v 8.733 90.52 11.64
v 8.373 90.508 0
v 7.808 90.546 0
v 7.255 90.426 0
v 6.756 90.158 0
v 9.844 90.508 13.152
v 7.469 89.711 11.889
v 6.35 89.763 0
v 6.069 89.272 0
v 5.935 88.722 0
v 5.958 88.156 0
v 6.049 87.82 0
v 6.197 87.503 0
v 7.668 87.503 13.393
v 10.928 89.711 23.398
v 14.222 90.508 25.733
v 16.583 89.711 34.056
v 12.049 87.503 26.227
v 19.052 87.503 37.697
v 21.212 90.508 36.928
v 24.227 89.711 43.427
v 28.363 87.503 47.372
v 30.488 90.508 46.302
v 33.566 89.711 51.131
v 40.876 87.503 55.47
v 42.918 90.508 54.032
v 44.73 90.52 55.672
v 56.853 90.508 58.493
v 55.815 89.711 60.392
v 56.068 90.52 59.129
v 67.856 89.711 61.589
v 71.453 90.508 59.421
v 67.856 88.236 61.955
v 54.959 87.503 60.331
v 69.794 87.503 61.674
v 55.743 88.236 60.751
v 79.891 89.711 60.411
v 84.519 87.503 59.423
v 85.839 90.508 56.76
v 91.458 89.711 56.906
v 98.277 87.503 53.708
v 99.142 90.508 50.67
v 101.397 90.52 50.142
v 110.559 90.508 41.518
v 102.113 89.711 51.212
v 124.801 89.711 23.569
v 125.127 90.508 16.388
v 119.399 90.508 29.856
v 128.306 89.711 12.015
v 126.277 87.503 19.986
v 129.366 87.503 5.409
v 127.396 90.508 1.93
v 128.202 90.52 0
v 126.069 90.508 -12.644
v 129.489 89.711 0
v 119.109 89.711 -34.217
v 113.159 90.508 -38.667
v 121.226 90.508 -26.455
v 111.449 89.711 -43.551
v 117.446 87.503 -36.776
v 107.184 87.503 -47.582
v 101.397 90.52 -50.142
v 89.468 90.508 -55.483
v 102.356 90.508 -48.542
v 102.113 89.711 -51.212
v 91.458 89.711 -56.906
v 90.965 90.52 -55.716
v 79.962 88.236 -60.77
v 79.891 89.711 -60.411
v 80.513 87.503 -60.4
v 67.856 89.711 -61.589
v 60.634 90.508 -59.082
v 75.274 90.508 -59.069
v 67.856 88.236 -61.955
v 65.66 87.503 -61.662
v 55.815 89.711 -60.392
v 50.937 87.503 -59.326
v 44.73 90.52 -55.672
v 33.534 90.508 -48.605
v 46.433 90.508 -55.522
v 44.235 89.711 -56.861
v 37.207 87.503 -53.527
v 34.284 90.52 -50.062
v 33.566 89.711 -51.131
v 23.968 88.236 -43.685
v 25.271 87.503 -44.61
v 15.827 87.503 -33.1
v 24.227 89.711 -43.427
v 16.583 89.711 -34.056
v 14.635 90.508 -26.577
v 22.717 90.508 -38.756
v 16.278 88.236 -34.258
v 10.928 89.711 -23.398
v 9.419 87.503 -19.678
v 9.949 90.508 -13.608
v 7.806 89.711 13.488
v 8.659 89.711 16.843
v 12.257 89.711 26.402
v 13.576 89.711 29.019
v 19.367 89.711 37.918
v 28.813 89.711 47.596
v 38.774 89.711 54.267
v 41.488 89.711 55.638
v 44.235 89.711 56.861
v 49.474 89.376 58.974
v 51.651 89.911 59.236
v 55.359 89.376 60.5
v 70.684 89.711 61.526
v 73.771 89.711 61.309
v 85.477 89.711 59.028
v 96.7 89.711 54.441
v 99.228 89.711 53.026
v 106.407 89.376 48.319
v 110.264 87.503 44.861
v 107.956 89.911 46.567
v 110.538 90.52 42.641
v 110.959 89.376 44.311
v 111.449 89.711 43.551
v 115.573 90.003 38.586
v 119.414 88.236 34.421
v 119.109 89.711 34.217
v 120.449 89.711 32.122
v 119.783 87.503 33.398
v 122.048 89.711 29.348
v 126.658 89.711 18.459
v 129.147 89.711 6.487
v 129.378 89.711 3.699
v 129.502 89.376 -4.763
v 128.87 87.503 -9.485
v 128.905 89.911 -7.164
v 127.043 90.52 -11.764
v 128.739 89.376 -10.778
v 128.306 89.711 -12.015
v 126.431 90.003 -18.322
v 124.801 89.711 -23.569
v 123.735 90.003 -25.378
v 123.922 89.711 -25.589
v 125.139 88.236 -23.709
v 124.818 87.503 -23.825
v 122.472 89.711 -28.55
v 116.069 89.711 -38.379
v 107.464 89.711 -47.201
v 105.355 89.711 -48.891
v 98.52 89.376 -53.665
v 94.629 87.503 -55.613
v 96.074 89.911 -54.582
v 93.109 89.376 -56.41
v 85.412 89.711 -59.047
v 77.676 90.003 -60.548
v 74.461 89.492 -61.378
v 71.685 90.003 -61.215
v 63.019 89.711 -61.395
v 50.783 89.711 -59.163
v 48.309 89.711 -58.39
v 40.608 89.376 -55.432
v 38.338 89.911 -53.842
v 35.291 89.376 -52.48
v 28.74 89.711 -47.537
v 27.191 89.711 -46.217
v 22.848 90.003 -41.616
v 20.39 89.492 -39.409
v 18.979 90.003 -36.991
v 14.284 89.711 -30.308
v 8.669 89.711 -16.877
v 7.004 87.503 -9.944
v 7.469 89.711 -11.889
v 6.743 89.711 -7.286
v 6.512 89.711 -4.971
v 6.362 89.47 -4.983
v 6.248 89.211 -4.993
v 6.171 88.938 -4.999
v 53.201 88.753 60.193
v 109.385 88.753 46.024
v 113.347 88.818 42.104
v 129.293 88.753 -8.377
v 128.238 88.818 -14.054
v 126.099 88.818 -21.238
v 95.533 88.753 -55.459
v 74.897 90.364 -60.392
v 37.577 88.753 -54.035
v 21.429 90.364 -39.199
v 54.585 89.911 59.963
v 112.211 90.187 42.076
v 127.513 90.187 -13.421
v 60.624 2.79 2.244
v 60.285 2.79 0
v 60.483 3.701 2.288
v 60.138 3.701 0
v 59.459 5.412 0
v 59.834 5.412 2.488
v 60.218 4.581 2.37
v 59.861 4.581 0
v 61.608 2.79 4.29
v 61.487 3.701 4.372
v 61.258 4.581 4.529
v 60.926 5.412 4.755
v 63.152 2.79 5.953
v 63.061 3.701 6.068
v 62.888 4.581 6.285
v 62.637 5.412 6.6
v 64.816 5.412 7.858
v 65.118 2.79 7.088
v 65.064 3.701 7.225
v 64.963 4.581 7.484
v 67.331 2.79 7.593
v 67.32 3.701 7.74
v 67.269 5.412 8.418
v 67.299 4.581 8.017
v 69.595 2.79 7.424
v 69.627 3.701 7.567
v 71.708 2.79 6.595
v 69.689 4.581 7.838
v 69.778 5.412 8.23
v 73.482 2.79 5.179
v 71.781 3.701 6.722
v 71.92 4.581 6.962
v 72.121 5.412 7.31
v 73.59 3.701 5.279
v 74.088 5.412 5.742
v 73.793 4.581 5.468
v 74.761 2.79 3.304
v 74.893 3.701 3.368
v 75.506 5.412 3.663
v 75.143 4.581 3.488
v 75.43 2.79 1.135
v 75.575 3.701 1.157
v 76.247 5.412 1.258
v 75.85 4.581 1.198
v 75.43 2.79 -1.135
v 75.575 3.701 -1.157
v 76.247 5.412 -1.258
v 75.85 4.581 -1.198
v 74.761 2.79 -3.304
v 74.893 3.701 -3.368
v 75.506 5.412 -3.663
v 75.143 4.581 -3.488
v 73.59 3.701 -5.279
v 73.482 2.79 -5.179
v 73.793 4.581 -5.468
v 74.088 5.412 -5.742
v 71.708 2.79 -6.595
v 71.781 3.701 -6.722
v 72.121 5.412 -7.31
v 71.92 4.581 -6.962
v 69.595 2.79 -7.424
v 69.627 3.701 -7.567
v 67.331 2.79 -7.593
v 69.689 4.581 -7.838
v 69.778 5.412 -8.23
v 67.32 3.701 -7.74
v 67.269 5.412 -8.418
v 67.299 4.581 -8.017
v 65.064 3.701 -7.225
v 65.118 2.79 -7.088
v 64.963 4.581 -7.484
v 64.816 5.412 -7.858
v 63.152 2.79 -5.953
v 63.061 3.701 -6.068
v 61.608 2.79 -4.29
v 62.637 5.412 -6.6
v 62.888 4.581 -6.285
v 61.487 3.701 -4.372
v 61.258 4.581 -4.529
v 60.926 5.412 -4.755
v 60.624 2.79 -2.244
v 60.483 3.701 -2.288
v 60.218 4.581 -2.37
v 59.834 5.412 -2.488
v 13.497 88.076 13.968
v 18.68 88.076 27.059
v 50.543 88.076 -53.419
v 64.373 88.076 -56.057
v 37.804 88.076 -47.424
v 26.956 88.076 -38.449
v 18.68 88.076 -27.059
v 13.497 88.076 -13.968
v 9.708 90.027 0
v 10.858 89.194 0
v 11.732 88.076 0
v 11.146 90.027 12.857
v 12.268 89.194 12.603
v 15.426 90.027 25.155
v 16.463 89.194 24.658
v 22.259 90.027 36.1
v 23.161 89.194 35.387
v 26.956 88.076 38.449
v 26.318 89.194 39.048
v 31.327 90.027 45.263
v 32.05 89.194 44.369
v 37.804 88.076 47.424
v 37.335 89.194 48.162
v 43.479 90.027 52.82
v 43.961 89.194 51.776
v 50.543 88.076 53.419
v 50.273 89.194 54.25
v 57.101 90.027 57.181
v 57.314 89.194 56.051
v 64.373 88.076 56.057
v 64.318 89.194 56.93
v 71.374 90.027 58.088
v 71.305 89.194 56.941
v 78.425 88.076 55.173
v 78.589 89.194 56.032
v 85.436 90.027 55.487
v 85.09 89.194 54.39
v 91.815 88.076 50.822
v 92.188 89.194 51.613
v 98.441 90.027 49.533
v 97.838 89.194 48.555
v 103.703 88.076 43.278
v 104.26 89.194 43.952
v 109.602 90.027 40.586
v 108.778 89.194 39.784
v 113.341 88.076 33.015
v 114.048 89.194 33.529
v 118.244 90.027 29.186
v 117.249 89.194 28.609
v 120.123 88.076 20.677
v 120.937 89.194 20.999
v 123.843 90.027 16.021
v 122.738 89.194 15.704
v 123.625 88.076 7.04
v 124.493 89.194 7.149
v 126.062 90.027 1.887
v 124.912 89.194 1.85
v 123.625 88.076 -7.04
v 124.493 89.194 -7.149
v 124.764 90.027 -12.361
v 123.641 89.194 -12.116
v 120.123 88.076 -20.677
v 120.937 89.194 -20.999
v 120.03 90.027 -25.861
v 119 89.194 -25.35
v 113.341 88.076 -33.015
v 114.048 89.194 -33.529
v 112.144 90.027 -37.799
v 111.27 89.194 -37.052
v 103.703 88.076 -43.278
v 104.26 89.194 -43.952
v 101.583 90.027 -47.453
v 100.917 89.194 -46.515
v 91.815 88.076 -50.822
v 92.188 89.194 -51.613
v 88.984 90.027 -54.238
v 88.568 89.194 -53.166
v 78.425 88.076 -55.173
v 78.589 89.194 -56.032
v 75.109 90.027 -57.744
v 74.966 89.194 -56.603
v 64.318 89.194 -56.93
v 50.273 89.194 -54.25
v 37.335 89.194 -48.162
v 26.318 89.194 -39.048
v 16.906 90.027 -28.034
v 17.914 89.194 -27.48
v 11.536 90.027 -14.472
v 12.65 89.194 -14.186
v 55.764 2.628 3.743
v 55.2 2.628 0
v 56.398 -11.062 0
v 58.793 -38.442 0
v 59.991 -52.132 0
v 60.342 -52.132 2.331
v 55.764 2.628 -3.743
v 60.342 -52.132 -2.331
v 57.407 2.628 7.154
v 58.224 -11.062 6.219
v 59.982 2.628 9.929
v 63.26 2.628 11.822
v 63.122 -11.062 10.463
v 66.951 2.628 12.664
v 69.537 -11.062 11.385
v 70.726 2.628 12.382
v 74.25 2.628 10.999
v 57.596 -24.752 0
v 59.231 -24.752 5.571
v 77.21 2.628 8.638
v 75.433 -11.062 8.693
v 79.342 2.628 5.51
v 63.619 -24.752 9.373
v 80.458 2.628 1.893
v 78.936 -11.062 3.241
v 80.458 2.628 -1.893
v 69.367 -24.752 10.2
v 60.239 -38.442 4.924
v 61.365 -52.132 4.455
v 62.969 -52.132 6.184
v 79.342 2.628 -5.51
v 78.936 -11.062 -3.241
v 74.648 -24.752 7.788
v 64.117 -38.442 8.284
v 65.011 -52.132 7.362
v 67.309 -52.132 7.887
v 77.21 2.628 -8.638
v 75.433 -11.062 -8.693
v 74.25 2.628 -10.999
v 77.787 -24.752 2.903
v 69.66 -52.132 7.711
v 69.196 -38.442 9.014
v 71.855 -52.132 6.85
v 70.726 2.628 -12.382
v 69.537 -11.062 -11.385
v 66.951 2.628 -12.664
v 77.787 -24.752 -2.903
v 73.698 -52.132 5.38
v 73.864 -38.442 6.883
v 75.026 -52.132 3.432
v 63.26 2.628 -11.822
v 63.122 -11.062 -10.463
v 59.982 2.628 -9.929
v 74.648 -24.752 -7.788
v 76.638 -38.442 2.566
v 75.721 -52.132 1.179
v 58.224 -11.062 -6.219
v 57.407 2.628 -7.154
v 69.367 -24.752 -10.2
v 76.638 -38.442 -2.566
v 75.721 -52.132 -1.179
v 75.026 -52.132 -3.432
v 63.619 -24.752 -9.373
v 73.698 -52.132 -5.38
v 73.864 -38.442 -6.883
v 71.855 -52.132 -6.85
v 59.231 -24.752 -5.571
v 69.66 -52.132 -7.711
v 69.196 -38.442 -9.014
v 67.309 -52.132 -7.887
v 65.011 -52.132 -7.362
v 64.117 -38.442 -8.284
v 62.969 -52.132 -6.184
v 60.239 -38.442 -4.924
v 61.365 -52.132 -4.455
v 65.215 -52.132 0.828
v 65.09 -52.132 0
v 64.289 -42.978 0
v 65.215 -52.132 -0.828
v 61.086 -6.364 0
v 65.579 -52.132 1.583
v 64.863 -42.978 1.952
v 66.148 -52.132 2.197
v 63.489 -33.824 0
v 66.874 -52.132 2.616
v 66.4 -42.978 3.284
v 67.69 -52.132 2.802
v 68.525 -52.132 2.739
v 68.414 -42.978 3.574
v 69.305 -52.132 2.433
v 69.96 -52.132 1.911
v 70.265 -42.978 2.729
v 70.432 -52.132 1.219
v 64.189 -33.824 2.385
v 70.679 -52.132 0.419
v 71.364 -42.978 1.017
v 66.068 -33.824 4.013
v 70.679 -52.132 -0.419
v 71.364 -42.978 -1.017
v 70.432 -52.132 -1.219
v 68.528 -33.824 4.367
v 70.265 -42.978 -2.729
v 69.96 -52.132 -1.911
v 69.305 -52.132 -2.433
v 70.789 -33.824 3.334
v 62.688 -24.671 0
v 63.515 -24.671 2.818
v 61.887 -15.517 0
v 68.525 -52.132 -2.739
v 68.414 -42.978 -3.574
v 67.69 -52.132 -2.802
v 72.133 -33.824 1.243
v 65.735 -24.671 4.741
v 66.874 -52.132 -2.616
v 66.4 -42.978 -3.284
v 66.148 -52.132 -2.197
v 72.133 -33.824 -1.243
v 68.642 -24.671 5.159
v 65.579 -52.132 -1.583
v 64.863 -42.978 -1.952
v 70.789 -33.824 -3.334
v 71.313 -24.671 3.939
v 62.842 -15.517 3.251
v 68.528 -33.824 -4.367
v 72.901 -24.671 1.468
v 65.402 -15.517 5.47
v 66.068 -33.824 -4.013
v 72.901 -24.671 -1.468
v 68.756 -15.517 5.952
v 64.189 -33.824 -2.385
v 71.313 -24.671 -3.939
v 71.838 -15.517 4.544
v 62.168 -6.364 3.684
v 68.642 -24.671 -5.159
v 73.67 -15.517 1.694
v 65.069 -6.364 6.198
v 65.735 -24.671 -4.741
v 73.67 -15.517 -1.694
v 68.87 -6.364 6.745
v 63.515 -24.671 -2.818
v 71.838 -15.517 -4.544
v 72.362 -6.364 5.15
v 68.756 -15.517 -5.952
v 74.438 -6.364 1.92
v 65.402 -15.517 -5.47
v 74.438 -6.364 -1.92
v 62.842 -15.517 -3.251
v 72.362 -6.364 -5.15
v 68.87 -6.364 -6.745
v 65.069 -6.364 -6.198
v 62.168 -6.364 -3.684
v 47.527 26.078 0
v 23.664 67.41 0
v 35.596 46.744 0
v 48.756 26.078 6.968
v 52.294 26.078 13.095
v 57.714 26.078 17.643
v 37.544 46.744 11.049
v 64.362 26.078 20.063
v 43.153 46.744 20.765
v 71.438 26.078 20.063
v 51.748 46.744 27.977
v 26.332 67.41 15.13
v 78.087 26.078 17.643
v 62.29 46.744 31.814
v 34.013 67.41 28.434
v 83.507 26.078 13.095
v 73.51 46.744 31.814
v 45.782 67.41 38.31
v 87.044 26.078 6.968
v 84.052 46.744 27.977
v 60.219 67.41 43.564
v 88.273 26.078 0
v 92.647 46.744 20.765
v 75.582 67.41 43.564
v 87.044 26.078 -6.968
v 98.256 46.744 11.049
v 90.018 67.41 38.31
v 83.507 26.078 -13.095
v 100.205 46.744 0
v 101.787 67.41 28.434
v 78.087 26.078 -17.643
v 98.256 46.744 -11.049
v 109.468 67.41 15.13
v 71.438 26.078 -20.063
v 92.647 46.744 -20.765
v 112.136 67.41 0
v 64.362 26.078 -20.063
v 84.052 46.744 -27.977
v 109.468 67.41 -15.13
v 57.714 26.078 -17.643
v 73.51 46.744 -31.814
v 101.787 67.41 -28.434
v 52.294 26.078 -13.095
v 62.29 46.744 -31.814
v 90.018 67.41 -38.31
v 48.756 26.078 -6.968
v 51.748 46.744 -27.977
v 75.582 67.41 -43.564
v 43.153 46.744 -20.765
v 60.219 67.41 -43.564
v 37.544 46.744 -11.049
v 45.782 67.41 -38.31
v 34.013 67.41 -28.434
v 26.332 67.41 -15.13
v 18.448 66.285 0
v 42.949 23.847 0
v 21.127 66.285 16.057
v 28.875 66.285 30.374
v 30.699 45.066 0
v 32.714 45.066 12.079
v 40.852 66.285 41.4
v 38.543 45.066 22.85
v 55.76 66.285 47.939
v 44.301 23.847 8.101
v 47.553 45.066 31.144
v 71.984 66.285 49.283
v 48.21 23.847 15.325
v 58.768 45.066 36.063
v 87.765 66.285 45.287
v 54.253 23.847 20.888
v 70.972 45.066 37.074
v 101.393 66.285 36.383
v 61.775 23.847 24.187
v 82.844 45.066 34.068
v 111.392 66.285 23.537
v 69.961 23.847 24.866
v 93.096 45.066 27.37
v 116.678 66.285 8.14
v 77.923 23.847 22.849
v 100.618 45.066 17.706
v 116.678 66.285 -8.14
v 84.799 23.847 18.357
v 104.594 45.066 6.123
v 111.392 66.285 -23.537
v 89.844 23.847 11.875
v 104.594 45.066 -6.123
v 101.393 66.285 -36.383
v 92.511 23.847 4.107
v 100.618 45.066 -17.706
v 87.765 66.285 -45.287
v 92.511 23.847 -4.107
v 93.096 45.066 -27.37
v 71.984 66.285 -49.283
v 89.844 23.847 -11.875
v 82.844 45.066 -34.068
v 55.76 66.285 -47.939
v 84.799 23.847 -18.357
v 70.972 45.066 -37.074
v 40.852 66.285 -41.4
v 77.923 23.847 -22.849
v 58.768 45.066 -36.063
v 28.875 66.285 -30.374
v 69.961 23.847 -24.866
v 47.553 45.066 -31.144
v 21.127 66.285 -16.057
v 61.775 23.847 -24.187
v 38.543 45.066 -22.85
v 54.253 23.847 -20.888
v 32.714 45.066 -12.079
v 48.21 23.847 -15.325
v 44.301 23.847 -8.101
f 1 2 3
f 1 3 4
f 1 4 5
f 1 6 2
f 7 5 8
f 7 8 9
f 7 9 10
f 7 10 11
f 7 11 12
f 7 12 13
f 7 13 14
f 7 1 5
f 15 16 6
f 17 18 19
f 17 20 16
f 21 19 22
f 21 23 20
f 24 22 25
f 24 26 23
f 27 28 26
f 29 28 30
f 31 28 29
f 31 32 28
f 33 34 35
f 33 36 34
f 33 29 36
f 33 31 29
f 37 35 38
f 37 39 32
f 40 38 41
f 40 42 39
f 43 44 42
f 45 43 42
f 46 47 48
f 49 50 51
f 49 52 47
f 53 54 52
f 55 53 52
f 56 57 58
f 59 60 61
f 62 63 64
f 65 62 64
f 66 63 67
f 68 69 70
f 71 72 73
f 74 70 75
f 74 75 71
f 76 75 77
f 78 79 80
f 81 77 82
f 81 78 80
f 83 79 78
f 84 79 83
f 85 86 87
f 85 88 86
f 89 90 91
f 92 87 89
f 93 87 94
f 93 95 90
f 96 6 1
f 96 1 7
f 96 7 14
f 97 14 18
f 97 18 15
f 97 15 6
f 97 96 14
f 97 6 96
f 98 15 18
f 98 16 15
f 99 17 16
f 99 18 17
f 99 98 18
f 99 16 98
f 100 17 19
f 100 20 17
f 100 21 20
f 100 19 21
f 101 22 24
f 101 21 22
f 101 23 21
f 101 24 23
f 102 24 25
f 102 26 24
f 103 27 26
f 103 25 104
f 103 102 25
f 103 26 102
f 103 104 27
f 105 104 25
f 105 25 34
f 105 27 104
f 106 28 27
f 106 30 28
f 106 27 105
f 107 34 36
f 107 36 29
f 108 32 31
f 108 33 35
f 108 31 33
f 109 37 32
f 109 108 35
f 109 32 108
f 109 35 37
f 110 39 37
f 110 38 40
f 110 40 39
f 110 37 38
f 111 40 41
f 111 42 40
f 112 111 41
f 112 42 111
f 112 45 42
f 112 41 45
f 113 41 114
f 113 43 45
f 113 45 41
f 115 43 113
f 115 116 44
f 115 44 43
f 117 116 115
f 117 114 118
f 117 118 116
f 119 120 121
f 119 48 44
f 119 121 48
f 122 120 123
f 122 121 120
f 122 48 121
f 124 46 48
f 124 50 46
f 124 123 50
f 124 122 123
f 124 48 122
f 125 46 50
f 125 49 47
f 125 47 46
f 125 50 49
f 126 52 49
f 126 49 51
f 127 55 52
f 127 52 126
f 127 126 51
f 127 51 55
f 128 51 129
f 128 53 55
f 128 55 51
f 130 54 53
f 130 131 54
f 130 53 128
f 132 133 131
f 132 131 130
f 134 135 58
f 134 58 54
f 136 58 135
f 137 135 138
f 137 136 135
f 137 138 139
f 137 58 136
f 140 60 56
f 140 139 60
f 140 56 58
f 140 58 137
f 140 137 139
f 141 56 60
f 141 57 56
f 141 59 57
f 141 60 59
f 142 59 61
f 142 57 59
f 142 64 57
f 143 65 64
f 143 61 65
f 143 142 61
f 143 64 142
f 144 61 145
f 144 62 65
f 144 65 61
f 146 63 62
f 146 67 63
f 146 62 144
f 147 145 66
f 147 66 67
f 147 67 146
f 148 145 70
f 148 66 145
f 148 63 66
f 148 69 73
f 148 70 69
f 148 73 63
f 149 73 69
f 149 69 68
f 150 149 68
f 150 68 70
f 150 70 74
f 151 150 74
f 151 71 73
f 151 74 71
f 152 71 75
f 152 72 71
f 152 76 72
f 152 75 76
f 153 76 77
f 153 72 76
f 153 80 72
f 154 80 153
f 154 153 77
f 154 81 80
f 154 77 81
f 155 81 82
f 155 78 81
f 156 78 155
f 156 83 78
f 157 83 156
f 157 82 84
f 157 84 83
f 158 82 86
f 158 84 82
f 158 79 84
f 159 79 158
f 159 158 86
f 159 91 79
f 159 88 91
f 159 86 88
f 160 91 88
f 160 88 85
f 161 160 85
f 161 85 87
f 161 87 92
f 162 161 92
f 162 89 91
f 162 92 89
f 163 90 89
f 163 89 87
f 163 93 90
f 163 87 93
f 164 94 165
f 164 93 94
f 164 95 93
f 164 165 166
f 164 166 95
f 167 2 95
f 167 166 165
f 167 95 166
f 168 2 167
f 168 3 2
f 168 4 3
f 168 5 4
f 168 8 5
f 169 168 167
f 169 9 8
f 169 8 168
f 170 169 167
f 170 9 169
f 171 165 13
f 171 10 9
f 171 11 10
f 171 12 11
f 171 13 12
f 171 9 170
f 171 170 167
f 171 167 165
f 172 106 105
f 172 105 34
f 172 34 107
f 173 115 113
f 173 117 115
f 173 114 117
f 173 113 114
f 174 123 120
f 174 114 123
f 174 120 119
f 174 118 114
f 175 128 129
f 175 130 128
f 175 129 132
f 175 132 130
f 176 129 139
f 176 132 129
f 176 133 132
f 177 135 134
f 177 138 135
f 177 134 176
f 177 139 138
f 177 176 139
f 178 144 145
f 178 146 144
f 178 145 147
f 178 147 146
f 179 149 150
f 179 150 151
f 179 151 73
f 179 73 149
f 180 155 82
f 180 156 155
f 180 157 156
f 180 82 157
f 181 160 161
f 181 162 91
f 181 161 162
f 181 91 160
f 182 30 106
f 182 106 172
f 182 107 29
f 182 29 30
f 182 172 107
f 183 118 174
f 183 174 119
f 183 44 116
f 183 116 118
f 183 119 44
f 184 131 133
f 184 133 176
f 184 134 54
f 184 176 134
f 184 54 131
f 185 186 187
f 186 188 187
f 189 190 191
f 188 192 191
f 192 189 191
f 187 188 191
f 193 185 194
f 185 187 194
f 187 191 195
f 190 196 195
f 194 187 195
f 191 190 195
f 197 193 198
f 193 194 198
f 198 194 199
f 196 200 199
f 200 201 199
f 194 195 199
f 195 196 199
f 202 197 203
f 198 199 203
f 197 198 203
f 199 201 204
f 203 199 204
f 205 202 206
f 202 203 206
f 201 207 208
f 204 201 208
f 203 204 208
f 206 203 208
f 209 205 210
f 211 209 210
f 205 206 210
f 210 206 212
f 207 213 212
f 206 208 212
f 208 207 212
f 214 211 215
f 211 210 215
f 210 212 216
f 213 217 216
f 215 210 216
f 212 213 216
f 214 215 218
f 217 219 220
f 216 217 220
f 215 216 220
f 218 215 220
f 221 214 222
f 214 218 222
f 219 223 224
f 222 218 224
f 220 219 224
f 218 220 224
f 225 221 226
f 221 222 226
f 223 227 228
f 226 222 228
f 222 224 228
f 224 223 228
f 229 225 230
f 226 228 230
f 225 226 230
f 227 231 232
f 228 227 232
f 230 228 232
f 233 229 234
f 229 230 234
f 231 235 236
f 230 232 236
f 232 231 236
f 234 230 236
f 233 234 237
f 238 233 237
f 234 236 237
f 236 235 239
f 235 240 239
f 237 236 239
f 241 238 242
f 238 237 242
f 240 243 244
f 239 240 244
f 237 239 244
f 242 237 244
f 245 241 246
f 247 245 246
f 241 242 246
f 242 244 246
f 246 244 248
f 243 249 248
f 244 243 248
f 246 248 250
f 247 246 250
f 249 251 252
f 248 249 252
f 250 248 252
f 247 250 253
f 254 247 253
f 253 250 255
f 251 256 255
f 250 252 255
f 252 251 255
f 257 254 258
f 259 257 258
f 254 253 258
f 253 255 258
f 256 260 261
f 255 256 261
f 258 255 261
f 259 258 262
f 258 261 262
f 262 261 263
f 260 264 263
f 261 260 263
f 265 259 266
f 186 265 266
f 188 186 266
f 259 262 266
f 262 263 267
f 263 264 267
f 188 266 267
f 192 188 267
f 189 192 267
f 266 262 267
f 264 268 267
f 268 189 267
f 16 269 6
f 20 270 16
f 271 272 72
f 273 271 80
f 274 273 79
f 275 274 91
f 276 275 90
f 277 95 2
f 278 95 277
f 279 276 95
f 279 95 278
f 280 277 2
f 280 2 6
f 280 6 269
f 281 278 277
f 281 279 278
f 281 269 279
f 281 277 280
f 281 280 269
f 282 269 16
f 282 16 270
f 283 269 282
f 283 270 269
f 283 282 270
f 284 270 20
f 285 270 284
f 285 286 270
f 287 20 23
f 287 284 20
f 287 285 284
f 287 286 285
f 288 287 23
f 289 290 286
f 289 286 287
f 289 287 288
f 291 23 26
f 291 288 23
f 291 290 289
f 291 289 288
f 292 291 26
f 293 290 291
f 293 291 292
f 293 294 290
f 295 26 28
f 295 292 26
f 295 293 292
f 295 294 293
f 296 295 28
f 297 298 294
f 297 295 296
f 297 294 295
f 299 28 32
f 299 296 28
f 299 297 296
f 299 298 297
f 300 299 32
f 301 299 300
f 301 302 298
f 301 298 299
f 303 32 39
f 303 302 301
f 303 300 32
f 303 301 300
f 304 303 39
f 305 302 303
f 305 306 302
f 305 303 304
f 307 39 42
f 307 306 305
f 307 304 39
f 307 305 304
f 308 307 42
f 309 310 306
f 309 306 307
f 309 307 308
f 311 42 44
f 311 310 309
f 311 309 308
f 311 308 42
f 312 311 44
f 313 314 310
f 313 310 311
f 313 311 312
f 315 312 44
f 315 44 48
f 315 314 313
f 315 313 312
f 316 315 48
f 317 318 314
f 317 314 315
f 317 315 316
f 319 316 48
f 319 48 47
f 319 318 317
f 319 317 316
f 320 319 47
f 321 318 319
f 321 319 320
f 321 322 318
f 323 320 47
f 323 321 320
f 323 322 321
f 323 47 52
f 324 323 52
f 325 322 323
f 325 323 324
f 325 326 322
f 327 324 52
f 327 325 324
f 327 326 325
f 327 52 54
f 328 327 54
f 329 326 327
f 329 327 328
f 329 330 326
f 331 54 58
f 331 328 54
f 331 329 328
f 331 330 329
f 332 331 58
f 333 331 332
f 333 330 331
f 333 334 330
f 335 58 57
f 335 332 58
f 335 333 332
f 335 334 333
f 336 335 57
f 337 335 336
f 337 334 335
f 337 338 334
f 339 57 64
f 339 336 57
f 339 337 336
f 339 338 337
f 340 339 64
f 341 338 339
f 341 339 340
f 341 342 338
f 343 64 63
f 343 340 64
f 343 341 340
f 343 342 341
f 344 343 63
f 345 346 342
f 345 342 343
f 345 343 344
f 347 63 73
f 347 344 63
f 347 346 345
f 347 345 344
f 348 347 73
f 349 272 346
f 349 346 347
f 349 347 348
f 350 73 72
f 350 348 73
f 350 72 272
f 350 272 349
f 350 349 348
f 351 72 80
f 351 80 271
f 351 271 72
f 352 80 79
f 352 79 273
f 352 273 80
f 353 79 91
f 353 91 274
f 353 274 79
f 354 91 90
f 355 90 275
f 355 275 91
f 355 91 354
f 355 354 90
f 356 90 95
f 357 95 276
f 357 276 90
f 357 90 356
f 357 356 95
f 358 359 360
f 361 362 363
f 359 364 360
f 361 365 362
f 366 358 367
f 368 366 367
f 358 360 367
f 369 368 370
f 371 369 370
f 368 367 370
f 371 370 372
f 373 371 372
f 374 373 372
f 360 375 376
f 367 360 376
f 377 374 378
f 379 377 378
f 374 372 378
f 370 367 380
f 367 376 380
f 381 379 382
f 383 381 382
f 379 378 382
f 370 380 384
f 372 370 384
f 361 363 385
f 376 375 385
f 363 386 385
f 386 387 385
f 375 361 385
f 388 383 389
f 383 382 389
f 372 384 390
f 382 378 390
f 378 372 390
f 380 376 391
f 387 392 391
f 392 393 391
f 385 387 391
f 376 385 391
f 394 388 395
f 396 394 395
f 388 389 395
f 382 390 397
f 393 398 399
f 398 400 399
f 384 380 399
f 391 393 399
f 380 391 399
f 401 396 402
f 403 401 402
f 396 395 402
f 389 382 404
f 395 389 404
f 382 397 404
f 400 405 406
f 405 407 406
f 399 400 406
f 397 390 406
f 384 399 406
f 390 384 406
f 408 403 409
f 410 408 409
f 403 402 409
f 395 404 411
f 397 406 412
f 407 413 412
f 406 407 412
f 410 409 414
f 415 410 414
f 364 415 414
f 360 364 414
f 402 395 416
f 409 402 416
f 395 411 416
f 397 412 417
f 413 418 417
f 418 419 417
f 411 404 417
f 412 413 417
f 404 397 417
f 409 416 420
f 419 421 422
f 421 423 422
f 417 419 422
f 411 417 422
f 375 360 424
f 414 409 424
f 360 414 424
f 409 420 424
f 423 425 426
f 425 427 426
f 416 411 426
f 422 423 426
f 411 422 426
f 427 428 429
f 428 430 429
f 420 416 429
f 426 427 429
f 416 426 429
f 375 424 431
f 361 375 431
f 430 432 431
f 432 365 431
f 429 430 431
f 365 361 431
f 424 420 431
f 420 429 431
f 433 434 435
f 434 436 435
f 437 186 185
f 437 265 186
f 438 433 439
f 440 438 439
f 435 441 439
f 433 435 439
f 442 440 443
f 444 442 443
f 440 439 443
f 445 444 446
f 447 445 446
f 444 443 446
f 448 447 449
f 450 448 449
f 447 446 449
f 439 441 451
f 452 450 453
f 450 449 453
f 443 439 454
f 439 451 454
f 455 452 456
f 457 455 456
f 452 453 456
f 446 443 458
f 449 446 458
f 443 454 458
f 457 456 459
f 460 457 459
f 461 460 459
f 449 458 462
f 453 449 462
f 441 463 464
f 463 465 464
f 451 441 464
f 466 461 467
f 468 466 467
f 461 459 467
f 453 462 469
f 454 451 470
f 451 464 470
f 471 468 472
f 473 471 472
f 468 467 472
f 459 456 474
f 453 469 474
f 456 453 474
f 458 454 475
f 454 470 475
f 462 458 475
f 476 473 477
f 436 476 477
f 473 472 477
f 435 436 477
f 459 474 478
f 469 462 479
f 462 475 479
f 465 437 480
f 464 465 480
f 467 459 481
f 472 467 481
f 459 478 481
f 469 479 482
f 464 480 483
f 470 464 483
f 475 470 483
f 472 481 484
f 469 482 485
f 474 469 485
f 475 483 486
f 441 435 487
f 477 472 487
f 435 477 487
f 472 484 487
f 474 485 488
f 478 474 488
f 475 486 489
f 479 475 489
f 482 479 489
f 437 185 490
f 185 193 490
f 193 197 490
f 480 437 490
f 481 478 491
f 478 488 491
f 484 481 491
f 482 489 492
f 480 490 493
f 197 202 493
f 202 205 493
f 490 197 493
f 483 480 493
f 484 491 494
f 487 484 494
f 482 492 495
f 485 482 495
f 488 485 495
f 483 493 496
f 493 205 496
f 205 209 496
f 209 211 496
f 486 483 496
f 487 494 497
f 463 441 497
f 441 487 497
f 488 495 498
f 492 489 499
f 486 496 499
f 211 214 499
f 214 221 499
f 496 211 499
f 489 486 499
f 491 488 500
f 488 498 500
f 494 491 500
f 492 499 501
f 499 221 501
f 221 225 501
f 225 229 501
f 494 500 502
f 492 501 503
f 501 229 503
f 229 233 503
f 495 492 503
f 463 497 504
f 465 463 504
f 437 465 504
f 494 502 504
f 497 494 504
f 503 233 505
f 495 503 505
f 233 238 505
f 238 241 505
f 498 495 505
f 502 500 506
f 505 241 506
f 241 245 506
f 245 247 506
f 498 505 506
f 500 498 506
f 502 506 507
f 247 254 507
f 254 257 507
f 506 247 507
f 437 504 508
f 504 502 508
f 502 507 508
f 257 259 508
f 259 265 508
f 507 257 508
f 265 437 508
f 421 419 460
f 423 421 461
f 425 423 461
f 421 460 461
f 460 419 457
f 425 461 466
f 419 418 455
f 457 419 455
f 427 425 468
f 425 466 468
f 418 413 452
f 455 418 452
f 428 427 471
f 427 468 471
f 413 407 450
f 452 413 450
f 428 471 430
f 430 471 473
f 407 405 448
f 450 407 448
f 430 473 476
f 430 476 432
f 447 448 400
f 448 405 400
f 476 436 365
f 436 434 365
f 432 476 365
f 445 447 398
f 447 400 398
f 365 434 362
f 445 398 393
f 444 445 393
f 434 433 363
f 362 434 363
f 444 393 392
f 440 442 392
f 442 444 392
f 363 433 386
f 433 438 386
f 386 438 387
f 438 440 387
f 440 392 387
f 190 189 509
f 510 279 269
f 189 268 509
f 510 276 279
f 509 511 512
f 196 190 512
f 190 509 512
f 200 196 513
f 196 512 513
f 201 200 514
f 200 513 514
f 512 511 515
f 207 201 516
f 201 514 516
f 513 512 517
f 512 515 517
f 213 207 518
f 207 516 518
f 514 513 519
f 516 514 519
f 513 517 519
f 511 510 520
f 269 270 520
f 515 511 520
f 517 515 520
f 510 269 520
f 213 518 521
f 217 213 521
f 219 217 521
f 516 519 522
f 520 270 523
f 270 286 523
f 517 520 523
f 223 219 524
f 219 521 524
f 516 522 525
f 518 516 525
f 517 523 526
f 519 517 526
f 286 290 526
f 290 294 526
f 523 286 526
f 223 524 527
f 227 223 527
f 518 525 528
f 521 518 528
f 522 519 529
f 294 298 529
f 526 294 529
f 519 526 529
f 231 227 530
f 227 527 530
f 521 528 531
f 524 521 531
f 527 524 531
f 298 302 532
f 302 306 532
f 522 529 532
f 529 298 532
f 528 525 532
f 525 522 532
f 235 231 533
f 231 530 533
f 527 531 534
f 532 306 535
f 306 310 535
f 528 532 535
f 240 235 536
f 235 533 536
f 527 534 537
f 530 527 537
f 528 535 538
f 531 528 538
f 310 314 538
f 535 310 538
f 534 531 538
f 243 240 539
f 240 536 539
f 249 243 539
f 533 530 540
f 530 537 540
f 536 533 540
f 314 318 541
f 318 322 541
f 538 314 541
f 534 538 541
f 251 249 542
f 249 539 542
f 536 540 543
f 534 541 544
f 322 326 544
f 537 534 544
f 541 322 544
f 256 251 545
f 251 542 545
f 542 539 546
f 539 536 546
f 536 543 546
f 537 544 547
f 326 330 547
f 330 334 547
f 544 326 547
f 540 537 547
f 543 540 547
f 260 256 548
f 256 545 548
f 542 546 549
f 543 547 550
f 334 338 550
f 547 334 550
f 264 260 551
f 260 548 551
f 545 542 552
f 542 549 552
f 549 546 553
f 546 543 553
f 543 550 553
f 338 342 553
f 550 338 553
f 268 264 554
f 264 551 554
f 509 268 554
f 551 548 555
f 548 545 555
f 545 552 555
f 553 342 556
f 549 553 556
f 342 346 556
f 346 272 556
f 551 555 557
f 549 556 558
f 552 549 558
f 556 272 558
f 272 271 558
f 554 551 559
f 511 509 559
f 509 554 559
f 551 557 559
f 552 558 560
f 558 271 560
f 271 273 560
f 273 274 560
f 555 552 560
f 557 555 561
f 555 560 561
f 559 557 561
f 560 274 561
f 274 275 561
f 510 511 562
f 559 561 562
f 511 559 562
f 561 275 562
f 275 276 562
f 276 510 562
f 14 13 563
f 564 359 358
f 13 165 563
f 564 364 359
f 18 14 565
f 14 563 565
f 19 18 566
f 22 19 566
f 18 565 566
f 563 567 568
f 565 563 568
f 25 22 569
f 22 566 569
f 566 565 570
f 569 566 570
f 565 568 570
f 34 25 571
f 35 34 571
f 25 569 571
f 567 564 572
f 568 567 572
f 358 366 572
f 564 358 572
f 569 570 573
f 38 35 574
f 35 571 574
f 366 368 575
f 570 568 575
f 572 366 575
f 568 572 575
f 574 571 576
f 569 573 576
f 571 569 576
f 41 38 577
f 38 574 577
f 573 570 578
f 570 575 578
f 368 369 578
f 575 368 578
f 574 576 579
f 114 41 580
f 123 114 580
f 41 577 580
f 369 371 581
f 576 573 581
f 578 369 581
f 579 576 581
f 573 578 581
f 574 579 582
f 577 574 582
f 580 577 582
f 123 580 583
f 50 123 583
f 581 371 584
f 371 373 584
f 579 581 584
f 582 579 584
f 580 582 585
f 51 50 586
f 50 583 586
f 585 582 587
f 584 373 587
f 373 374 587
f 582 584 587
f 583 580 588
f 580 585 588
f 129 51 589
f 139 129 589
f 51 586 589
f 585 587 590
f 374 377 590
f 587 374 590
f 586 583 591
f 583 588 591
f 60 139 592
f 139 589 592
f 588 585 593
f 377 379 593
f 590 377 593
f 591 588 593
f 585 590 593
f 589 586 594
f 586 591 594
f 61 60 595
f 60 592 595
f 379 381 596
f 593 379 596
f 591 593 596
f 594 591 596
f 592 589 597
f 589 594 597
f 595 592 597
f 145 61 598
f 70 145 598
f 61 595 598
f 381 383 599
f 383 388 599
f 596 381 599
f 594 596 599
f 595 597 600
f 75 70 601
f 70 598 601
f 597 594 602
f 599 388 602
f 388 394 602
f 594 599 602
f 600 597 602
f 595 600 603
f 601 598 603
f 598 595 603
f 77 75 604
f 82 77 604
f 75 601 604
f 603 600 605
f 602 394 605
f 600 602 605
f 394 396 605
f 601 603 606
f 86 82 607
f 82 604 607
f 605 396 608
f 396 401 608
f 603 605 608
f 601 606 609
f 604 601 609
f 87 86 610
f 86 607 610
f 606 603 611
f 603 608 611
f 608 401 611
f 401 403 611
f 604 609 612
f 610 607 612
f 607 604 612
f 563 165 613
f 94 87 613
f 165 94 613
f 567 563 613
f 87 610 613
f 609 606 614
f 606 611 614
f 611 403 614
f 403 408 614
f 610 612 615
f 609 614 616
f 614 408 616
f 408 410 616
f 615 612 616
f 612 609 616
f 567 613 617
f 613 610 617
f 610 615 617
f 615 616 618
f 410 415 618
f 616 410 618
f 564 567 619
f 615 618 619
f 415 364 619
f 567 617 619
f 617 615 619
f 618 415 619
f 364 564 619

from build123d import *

# Parameters (mm, degrees)
F2_R = 5.08
F3_R = 2.032


with BuildPart() as f1:
    # F0 (on Top) → F1 (revolve)
    with BuildSketch(Plane.XY):
        with BuildLine():
            Line((10.2659887711, 90.615958193), (4.4001100361, 90.615958193))
            Line((4.4001100361, 90.615958193), (55.2001100361, 2.6277771685))
            Line((55.2001100361, 2.6277771685), (59.9909302565, -52.1315485239))
            Line((59.9909302565, -52.1315485239), (65.0903350313, -52.1315485239))
            Line((65.0903350313, -52.1315485239), (60.2853179954, 2.7900475113))
            ThreePointArc((60.2853179954, 2.7900475113), (60.0155842998, 4.1460903717), (59.4587429766, 5.4116085449))
            Line((59.4587429766, 5.4116085449), (10.2659887711, 90.615958193))
        make_face()
    revolve(axis=Axis((67.9001100361, 35.5695039034, 0), (0, 1, 0)))

    # F2
    f2_edges = [f1.edges().sort_by_distance(p)[0] for p in [
        (76.341477, 5.411609, 0),
        (125.534231, 90.615958, 0),
        (34.862366, 48.013783, 0),
    ]]
    fillet(f2_edges, radius=F2_R)

    # F3
    f3_edges = [f1.edges().sort_by_distance(p)[0] for p in [
        (131.40011, 90.615958, 0),
    ]]
    fillet(f3_edges, radius=F3_R)


solid = f1.part
